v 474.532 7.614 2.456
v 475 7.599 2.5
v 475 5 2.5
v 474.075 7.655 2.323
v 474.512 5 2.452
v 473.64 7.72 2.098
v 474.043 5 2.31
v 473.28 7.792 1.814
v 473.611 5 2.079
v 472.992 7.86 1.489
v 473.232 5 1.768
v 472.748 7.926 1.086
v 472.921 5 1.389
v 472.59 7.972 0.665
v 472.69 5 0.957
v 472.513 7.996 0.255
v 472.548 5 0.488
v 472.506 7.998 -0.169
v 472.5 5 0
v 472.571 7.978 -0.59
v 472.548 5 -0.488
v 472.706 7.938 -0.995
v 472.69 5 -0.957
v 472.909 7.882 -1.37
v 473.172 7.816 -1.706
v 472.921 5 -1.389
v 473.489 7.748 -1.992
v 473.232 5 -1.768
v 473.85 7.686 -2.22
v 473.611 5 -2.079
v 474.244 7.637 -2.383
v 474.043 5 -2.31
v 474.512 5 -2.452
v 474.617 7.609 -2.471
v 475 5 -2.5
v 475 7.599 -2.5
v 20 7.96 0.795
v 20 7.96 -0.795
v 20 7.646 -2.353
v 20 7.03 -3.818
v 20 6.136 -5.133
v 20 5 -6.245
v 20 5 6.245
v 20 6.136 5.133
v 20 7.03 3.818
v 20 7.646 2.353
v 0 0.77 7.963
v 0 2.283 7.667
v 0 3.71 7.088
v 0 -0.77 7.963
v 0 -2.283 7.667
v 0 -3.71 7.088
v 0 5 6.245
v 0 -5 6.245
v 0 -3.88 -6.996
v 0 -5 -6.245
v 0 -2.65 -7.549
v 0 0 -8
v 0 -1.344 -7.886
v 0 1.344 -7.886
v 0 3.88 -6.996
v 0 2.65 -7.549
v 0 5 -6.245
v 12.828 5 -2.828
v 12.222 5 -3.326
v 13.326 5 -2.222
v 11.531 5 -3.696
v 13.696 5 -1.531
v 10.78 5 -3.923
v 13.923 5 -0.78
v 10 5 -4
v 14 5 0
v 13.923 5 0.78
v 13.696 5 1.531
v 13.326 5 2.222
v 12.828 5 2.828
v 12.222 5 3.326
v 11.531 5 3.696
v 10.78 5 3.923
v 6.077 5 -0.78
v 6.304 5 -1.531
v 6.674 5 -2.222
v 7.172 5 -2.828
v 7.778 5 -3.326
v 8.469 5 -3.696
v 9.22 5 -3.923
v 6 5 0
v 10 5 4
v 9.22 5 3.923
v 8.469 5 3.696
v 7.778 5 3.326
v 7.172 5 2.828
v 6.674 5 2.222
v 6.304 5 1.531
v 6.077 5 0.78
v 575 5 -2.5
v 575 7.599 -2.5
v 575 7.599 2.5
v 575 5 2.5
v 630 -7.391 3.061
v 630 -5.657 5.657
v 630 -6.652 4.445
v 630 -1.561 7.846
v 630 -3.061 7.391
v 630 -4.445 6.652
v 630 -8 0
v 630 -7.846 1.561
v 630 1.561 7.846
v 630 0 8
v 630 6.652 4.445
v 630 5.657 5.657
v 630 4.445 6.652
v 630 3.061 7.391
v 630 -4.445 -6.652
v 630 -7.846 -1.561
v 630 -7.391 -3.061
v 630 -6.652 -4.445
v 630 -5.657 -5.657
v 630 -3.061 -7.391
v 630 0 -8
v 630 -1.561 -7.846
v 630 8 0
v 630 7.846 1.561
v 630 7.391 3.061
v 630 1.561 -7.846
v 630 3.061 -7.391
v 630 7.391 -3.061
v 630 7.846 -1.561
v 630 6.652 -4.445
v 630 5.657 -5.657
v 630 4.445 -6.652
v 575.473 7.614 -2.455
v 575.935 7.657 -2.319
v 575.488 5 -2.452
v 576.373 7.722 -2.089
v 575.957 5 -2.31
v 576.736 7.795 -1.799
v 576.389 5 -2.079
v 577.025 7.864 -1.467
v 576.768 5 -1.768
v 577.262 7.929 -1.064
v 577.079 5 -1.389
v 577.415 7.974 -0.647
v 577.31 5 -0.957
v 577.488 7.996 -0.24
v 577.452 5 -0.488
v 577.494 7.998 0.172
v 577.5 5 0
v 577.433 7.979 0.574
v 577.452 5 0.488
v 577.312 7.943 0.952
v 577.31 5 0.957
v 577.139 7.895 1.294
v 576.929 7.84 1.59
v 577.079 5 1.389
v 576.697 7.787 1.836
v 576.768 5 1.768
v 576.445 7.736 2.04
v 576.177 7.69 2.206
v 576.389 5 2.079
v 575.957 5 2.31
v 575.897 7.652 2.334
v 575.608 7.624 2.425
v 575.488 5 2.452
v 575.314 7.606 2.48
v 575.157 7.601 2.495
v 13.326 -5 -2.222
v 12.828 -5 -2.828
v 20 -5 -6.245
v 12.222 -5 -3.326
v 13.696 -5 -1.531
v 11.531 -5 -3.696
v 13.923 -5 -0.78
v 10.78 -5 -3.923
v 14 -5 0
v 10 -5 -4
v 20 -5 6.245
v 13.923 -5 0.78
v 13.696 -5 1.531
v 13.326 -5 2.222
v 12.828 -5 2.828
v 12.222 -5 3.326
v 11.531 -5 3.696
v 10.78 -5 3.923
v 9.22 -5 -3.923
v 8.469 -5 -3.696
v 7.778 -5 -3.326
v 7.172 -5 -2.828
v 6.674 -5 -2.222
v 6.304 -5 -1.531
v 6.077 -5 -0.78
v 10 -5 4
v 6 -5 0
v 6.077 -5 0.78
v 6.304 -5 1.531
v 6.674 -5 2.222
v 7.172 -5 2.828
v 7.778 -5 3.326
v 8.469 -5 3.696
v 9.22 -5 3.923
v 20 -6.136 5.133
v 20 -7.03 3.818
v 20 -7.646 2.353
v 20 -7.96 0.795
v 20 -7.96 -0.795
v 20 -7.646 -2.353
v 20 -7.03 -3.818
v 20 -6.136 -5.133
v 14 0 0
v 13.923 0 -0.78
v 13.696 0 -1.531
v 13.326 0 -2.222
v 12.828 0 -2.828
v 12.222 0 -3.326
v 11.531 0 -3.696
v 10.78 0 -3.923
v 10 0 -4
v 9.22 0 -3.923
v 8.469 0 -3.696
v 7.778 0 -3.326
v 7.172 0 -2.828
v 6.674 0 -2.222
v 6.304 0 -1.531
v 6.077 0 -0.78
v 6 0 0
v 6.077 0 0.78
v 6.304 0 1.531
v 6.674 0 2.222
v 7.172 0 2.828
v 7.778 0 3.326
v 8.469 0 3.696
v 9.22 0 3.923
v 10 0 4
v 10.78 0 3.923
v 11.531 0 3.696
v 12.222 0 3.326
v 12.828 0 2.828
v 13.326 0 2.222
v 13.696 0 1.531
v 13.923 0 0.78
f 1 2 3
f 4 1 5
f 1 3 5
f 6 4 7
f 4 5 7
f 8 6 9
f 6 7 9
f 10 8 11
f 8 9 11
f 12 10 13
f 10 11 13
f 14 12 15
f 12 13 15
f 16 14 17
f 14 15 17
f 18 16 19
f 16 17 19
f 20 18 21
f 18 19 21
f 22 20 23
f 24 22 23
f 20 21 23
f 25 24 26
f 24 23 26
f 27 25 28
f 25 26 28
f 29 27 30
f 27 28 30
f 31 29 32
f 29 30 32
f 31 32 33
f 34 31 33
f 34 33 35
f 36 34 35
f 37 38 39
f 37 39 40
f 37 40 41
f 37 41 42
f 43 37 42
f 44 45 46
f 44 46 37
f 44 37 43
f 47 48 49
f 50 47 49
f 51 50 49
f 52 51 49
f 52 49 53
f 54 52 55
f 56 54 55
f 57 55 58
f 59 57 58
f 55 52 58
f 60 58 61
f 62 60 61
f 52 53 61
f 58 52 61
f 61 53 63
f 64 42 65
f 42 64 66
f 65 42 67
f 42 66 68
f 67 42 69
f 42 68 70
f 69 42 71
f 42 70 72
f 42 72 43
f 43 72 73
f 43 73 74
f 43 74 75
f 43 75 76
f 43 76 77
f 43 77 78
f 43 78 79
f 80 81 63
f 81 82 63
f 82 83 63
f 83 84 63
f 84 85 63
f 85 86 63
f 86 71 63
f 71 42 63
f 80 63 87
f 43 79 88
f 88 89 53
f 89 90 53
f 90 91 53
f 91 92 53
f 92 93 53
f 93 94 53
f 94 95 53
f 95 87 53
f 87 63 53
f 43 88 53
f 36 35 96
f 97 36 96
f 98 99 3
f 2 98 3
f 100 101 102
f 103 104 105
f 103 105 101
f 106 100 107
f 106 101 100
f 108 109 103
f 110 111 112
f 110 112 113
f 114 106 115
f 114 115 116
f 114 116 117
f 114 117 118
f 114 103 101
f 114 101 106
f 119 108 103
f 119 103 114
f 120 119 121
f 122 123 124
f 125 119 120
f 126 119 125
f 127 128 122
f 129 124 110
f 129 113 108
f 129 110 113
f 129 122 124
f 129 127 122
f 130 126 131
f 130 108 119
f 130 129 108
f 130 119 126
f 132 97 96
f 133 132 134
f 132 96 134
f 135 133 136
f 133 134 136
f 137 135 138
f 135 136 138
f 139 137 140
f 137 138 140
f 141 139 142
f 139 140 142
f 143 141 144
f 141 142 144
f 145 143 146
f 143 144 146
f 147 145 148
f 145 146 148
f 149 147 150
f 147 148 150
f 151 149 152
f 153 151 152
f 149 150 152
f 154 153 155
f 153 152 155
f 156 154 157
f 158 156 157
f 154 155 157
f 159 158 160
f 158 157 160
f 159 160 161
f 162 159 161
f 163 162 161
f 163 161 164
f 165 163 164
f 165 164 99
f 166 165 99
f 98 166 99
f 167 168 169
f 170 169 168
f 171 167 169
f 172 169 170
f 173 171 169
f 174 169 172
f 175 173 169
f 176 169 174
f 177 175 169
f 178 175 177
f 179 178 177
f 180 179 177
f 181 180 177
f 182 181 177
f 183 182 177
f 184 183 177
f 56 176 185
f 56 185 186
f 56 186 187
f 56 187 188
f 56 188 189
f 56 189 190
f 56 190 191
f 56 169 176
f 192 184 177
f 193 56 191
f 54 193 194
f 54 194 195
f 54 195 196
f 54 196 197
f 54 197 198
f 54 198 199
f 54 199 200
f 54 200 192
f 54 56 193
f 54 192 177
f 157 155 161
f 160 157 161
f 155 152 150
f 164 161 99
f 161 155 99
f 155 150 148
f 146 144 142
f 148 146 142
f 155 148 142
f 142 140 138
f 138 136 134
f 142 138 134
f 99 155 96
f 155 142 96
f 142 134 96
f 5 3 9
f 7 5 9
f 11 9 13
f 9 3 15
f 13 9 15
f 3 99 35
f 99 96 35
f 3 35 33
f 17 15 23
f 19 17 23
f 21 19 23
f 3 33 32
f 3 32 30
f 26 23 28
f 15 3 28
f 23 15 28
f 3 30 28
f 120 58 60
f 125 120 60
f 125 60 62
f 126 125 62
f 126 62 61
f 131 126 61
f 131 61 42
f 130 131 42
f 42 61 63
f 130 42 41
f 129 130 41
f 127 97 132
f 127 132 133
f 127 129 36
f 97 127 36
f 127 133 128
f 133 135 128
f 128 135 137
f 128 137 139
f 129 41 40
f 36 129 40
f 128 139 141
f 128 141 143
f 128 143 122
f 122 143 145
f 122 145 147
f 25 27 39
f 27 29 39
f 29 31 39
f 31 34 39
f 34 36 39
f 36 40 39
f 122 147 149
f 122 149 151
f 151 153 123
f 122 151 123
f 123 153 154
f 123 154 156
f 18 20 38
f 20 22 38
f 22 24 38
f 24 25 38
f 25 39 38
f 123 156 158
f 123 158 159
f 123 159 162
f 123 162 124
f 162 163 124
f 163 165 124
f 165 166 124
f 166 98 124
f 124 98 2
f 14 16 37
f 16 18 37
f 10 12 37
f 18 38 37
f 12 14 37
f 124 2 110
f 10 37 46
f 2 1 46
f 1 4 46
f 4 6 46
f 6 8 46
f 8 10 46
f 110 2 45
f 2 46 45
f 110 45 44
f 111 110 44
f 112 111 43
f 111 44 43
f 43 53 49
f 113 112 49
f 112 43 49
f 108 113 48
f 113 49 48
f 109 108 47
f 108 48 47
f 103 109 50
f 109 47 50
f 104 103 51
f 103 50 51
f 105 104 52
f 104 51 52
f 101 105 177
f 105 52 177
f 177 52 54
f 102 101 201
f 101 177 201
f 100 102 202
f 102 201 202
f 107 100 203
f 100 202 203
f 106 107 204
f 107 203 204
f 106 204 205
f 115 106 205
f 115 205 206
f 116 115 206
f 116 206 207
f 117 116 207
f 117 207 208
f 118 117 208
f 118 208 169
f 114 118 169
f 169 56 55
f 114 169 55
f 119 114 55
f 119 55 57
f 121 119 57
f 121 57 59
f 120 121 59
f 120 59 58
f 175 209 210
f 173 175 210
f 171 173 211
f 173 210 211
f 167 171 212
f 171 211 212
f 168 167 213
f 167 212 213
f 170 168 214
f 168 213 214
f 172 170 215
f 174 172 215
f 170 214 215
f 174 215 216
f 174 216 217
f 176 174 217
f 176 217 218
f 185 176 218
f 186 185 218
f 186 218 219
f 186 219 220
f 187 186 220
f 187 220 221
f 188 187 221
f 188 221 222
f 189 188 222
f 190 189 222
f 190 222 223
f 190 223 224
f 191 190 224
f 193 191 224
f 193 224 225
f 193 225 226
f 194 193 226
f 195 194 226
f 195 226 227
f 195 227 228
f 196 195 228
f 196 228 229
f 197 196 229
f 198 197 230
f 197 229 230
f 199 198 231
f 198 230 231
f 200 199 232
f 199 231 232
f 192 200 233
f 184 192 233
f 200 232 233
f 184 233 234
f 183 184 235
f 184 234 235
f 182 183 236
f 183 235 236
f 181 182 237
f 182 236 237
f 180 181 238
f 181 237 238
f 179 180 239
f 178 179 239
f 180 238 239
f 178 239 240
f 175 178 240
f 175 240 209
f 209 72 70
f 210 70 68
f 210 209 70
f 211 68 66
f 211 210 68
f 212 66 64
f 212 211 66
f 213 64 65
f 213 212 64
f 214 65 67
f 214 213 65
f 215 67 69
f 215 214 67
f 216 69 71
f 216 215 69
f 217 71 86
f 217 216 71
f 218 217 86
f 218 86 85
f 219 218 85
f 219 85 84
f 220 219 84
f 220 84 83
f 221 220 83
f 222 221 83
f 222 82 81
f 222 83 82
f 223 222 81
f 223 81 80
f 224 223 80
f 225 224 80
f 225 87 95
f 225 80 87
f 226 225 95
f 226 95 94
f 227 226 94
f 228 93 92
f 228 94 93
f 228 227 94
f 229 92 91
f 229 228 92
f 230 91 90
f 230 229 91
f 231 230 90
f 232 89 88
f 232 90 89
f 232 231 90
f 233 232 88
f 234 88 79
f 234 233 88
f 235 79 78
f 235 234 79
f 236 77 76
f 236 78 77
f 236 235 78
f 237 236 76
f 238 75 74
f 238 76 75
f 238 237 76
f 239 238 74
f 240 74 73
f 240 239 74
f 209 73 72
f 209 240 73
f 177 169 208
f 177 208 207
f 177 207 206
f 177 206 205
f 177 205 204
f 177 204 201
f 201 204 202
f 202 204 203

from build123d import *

# Parameters (mm, degrees)
SKETCH_1_R               = 8
EXTRUDE_1_DEPTH          = 630
SKETCH_2_R               = 4
CUT_EXTRUDE_1_DEPTH      = 9
CUT_EXTRUDE_1_DEPTH_BACK = 9
SKETCH_3_OUTSIDE_W       = 144.082
SKETCH_3_OUTSIDE_H       = 144.082
SKETCH_3_OUTSIDE_W_2     = 20
SKETCH_3_OUTSIDE_H_2     = 10
CUT_EXTRUDE_2_DEPTH      = 20
CUT_EXTRUDE_START        = 5
CUT_EXTRUDE_3_DEPTH      = 4


with BuildPart() as part:
    # 草图1 → 凸台-拉伸1 (new body)
    with BuildSketch(Plane(origin=(0, 0, 0), x_dir=(0, 0, -1), z_dir=(1, 0, 0))):
        Circle(SKETCH_1_R)
    extrude(amount=EXTRUDE_1_DEPTH)

    # 草图2 → 切除-拉伸1 (cut, two sides)
    with BuildSketch(Plane(origin=(0, 0, 0), x_dir=(1, 0, 0), z_dir=(0, 1, 0))) as cut_extrude_1_sk:
        with Locations((10, 0)):
            Circle(SKETCH_2_R)
    extrude(amount=CUT_EXTRUDE_1_DEPTH, mode=Mode.SUBTRACT)
    extrude(cut_extrude_1_sk.sketch, amount=-CUT_EXTRUDE_1_DEPTH_BACK, mode=Mode.SUBTRACT)

    # 草图3 outside → 切除-拉伸2 (cut)
    with BuildSketch(Plane.ZY):
        Rectangle(SKETCH_3_OUTSIDE_W, SKETCH_3_OUTSIDE_H)
        Rectangle(SKETCH_3_OUTSIDE_W_2, SKETCH_3_OUTSIDE_H_2, mode=Mode.SUBTRACT)
    extrude(amount=-CUT_EXTRUDE_2_DEPTH, mode=Mode.SUBTRACT)

    # 草图4 → 切除-拉伸3 (cut, through all)
    with BuildSketch(Plane(origin=(0, 0, 0), x_dir=(1, 0, 0), z_dir=(0, 1, 0)).offset(CUT_EXTRUDE_START)):
        with BuildLine():
            Line((475, 2.5), (575, 2.5))
            ThreePointArc((575, 2.5), (577.5, 0), (575, -2.5))
            Line((575, -2.5), (475, -2.5))
            ThreePointArc((475, -2.5), (472.5, 0), (475, 2.5))
        make_face()
    extrude(amount=CUT_EXTRUDE_3_DEPTH, mode=Mode.SUBTRACT)


solid = part.part
